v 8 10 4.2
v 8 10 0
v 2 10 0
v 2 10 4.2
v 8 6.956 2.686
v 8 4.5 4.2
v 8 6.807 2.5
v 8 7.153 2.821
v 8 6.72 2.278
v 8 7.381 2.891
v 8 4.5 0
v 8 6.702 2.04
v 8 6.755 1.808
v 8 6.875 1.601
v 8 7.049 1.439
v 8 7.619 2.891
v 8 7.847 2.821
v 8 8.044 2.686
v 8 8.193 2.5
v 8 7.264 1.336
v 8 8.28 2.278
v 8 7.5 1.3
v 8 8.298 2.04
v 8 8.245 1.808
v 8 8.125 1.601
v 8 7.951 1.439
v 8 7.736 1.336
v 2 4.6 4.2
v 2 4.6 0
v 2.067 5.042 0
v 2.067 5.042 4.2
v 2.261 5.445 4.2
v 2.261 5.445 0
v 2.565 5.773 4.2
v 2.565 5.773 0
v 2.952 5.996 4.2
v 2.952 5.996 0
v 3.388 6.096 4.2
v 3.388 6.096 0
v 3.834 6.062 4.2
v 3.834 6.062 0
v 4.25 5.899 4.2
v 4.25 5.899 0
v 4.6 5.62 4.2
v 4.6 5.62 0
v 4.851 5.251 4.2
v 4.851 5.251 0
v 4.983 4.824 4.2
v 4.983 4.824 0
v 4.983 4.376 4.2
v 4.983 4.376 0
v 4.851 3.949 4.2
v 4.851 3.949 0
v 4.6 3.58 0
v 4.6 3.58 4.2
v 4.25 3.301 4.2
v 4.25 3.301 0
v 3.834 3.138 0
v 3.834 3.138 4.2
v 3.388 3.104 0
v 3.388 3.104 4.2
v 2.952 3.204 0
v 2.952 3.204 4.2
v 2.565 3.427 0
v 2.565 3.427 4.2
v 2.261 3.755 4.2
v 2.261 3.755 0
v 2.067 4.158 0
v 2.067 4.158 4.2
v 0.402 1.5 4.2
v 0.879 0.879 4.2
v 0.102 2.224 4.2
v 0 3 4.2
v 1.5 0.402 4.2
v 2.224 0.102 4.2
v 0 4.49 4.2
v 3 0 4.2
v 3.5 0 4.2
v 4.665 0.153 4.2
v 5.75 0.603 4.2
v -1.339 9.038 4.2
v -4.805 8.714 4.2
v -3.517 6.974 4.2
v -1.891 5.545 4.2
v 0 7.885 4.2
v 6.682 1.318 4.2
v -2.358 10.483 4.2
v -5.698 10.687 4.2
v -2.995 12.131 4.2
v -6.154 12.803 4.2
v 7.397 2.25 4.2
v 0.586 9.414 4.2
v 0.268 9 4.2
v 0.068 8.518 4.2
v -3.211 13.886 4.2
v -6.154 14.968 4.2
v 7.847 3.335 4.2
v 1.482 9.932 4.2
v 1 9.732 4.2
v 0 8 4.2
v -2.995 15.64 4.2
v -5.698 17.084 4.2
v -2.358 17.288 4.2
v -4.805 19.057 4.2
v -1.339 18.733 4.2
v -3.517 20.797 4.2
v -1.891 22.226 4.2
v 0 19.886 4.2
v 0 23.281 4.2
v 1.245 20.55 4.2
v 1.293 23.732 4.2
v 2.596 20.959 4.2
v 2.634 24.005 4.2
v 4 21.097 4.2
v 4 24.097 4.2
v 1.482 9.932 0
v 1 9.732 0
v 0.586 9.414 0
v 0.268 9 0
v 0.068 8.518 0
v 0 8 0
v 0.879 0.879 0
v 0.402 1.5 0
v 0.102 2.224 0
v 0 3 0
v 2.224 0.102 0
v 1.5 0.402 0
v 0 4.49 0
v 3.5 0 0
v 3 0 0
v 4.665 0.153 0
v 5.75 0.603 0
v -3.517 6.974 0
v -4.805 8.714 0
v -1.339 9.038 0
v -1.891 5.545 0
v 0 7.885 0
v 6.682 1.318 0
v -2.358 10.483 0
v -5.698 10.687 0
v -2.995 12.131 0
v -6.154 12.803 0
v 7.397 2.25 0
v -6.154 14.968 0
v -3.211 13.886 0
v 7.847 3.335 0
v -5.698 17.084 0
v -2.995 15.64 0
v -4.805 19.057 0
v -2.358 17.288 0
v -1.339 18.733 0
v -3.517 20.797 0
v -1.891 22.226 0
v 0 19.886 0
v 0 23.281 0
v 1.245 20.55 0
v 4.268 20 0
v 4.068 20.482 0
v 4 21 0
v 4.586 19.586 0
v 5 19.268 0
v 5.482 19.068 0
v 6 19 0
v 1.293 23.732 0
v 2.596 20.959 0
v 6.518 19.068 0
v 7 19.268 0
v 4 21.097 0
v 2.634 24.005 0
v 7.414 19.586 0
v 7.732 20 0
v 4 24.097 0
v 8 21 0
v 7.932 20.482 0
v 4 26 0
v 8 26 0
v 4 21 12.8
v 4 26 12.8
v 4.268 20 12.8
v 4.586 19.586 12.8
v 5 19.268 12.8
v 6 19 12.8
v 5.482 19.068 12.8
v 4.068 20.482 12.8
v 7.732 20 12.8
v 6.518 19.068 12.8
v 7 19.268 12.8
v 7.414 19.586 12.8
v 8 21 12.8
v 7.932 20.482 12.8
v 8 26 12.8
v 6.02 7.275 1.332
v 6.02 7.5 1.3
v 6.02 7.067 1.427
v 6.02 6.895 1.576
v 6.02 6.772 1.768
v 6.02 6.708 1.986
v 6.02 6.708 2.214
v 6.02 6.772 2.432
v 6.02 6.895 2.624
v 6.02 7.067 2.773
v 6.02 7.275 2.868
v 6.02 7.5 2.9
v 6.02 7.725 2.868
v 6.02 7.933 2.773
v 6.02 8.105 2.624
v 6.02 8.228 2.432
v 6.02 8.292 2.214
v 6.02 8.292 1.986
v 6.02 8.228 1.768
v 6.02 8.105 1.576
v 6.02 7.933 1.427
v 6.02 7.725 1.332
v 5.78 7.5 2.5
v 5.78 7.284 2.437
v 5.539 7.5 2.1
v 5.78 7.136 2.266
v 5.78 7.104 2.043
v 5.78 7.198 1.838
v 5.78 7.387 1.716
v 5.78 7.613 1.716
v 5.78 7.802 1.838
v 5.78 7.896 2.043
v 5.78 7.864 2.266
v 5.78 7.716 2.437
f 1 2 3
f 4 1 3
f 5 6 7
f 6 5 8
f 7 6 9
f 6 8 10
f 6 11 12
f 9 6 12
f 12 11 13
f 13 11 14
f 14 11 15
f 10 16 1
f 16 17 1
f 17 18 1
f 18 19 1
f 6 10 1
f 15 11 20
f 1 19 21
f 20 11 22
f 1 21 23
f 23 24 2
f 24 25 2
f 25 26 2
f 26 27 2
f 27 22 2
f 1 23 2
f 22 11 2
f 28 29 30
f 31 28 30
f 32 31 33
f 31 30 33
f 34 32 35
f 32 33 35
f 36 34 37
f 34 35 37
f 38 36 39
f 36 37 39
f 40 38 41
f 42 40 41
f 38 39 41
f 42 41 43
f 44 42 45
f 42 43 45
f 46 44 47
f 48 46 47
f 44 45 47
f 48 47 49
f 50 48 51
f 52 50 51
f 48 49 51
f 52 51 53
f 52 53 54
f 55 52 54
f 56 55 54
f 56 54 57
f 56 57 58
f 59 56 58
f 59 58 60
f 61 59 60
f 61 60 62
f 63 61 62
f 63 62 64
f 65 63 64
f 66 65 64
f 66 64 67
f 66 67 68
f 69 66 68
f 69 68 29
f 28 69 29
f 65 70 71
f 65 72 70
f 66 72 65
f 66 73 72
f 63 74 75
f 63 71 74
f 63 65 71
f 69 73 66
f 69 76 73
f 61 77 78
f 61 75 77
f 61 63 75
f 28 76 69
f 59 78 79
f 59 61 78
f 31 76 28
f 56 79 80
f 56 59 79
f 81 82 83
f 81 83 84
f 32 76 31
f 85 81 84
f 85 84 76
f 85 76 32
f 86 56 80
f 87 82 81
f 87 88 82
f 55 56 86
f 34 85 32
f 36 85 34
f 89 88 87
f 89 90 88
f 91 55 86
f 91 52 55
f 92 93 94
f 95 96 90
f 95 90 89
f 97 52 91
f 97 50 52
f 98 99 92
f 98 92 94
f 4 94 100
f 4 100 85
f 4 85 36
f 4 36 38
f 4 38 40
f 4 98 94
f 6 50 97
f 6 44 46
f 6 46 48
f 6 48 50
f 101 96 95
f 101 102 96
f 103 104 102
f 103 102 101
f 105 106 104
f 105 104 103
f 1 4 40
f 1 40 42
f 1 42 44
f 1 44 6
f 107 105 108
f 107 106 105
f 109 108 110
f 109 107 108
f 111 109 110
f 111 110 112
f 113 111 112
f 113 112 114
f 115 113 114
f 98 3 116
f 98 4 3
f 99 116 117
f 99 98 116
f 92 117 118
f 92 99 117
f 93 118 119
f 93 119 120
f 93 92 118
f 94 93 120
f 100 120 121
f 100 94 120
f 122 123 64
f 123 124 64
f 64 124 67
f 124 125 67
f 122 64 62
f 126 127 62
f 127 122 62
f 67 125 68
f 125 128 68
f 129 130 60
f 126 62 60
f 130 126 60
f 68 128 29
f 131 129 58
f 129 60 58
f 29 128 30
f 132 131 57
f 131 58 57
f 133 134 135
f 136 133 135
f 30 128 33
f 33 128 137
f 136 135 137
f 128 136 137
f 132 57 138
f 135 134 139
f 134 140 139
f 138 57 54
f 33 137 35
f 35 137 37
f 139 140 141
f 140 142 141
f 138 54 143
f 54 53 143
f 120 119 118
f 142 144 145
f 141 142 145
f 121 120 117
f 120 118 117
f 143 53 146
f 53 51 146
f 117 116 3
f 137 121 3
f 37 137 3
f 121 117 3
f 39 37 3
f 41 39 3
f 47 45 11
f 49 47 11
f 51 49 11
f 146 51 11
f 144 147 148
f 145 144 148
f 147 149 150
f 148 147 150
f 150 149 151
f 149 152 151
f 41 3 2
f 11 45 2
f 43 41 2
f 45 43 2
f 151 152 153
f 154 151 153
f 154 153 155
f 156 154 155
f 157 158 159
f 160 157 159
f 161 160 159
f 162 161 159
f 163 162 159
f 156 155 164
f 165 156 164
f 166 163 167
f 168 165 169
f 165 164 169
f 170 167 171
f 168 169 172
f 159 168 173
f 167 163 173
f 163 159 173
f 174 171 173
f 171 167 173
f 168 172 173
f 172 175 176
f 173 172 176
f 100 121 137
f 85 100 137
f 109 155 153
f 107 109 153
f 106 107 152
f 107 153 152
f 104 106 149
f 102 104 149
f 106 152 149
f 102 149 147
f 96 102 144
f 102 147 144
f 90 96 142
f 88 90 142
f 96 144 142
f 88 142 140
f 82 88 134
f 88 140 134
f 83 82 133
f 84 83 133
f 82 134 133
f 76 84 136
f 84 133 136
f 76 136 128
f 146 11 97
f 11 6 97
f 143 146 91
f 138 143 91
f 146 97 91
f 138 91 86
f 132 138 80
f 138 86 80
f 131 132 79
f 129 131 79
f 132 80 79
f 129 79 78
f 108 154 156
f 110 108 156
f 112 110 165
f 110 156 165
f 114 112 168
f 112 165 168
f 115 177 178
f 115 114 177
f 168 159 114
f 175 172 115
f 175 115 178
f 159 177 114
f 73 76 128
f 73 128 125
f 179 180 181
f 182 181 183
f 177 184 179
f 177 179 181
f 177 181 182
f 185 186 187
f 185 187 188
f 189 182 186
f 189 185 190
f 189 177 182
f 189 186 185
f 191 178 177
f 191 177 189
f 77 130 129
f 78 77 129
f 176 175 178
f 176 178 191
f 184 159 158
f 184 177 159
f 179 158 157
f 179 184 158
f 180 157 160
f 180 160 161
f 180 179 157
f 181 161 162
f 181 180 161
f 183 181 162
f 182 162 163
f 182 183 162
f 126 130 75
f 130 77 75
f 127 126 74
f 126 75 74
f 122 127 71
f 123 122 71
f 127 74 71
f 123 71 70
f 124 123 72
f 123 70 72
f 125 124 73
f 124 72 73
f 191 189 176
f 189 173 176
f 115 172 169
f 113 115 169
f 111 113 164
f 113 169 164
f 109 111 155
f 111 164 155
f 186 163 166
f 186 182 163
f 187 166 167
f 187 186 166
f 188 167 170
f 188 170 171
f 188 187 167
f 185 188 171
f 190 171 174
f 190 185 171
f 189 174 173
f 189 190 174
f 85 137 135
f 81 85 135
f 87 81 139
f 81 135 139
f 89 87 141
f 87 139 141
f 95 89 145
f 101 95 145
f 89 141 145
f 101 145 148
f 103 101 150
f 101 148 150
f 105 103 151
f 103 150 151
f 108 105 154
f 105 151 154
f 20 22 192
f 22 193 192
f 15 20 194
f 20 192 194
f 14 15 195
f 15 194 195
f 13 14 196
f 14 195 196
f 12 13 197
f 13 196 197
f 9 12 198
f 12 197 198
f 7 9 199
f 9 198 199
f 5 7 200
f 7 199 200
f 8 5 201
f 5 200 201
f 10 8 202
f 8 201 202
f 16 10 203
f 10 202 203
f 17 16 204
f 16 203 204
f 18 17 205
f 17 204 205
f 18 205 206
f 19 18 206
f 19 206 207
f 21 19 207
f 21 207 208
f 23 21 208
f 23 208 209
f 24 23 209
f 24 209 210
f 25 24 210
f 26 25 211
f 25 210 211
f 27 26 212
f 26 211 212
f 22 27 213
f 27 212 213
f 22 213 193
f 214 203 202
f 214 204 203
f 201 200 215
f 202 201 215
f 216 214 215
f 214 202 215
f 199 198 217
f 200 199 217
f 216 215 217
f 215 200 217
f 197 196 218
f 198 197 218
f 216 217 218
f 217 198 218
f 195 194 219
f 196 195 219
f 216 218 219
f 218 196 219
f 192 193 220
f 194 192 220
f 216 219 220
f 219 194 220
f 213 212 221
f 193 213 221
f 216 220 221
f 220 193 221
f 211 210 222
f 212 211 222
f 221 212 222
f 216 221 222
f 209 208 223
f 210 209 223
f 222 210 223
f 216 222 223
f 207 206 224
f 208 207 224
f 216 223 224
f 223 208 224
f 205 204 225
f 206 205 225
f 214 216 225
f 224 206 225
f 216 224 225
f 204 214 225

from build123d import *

# Parameters (mm, degrees)
BOSS_EXTRUDE1_DEPTH             = 4.2
SKETCH2_W                       = 4
SKETCH2_H                       = 7
BOSS_EXTRUDE2_DEPTH             = 8.6
FILLET1_R                       = 4.5
HOLE1_D                         = 3
HOLE1_DEPTH                     = 100
FILLET3_R                       = 2
FILLET4_R                       = 2
FILLET5_R                       = 3
TAP_DRILL_FOR_M2X0_4_TAP1_D     = 1.6
TAP_DRILL_FOR_M2X0_4_TAP1_DEPTH = 1.98
TAP_DRILL_FOR_M2X0_4_TAP1_TIP   = 0.480688495


with BuildPart() as part:
    # Sketch1 → Boss-Extrude1 (new body)
    with BuildSketch(Plane.XY):
        with BuildLine():
            Line((4, 26), (4, 24.096998671))
            ThreePointArc((4, 24.096998671), (6.041195573, 23.890909602), (8, 23.280961007))
            Line((8, 23.280961007), (8, 26))
            Line((8, 26), (4, 26))
        make_face()
        with BuildLine():
            ThreePointArc((8, 23.280961007), (6.041195573, 23.890909602), (4, 24.096998671))
            Line((4, 24.096998671), (4, 21.096998671))
            ThreePointArc((4, 21.096998671), (6.089651945, 20.787605561), (8, 19.885973898))
            Line((8, 19.885973898), (8, 23.280961007))
        make_face()
        with BuildLine():
            ThreePointArc((8, 19.885973898), (6.089651945, 20.787605561), (4, 21.096998671))
            Line((4, 21.096998671), (4, 19))
            Line((4, 19), (8, 19))
            Line((8, 19), (8, 19.885973898))
        make_face()
        with BuildLine():
            Line((4, 21.096998671), (4, 24.096998671))
            ThreePointArc((4, 24.096998671), (1.958804427, 23.890909602), (0, 23.280961007))
            Line((0, 23.280961007), (0, 19.885973898))
            ThreePointArc((0, 19.885973898), (1.910348055, 20.787605561), (4, 21.096998671))
        make_face()
        with BuildLine():
            Line((0, 7.885047636), (0, 4.490060527))
            ThreePointArc((0, 4.490060527), (1.958804427, 3.880111932), (4, 3.674022863))
            Line((4, 3.674022863), (4, 6.674022863))
            ThreePointArc((4, 6.674022863), (1.910348055, 6.983415973), (0, 7.885047636))
        make_face()
        with BuildLine():
            Line((0, 19.885973898), (0, 23.280961007))
            ThreePointArc((0, 23.280961007), (-6.211487904, 13.885510767), (0, 4.490060527))
            Line((0, 4.490060527), (0, 7.885047636))
            ThreePointArc((0, 7.885047636), (-3.211487904, 13.885510767), (0, 19.885973898))
        make_face()
        with BuildLine():
            ThreePointArc((4, 3.674022863), (1.958804427, 3.880111932), (0, 4.490060527))
            Line((0, 4.490060527), (0, 0))
            Line((0, 0), (8, 0))
            Line((8, 0), (8, 4.490060527))
            ThreePointArc((8, 4.490060527), (6.041195573, 3.880111932), (4, 3.674022863))
        make_face()
        with BuildLine():
            Line((8, 10), (4, 10))
            Line((4, 10), (4, 6.674022863))
            ThreePointArc((4, 6.674022863), (6.089651945, 6.983415973), (8, 7.885047636))
            Line((8, 7.885047636), (8, 10))
        make_face()
        with BuildLine():
            Line((4, 6.674022863), (4, 10))
            Line((4, 10), (0, 10))
            Line((0, 10), (0, 7.885047636))
            ThreePointArc((0, 7.885047636), (1.910348055, 6.983415973), (4, 6.674022863))
        make_face()
        with BuildLine():
            ThreePointArc((4, 3.674022863), (6.041195573, 3.880111932), (8, 4.490060527))
            Line((8, 4.490060527), (8, 7.885047636))
            ThreePointArc((8, 7.885047636), (6.089651945, 6.983415973), (4, 6.674022863))
            Line((4, 6.674022863), (4, 3.674022863))
        make_face()
    extrude(amount=BOSS_EXTRUDE1_DEPTH)

    # Sketch2 → Boss-Extrude2 (add)
    with BuildSketch(Plane.XY.offset(4.2)):
        with Locations((6, 22.5)):
            Rectangle(SKETCH2_W, SKETCH2_H)
    extrude(amount=BOSS_EXTRUDE2_DEPTH)

    # Fillet1
    fillet1_edges = [part.edges().sort_by_distance(p)[0] for p in [
        (8, 0, 2.1),
    ]]
    fillet(fillet1_edges, radius=FILLET1_R)

    # Hole1
    with Locations(Plane(origin=(3.5, 4.6, 4.2), x_dir=(1, 0, 0), z_dir=(0, 0, 1))):
        with Locations((0, 0)):
            Hole(HOLE1_D / 2, depth=HOLE1_DEPTH)

    # Fillet3
    fillet3_edges = [part.edges().sort_by_distance(p)[0] for p in [
        (0, 10, 2.1),
    ]]
    fillet(fillet3_edges, radius=FILLET3_R)

    # Fillet4
    fillet4_edges = [part.edges().sort_by_distance(p)[0] for p in [
        (8, 19, 6.4),
        (4, 19, 6.4),
    ]]
    fillet(fillet4_edges, radius=FILLET4_R - 0.0001)  # a hair under: the kernel refuses the full size

    # Fillet5
    fillet5_edges = [part.edges().sort_by_distance(p)[0] for p in [
        (0, 0, 2.1),
    ]]
    fillet(fillet5_edges, radius=FILLET5_R)

    # Tap Drill for M2x0.4 Tap1
    with Locations(Plane(origin=(8, 7.5, 2.1), x_dir=(0, 0, 1), z_dir=(1, 0, 0))):
        with Locations((0, 0)):
            Hole(TAP_DRILL_FOR_M2X0_4_TAP1_D / 2, depth=TAP_DRILL_FOR_M2X0_4_TAP1_DEPTH)
            with Locations((0, 0, -(TAP_DRILL_FOR_M2X0_4_TAP1_DEPTH + TAP_DRILL_FOR_M2X0_4_TAP1_TIP / 2))):  # 118° drill point
                Cone(0, TAP_DRILL_FOR_M2X0_4_TAP1_D / 2, TAP_DRILL_FOR_M2X0_4_TAP1_TIP, mode=Mode.SUBTRACT)


solid = part.part
